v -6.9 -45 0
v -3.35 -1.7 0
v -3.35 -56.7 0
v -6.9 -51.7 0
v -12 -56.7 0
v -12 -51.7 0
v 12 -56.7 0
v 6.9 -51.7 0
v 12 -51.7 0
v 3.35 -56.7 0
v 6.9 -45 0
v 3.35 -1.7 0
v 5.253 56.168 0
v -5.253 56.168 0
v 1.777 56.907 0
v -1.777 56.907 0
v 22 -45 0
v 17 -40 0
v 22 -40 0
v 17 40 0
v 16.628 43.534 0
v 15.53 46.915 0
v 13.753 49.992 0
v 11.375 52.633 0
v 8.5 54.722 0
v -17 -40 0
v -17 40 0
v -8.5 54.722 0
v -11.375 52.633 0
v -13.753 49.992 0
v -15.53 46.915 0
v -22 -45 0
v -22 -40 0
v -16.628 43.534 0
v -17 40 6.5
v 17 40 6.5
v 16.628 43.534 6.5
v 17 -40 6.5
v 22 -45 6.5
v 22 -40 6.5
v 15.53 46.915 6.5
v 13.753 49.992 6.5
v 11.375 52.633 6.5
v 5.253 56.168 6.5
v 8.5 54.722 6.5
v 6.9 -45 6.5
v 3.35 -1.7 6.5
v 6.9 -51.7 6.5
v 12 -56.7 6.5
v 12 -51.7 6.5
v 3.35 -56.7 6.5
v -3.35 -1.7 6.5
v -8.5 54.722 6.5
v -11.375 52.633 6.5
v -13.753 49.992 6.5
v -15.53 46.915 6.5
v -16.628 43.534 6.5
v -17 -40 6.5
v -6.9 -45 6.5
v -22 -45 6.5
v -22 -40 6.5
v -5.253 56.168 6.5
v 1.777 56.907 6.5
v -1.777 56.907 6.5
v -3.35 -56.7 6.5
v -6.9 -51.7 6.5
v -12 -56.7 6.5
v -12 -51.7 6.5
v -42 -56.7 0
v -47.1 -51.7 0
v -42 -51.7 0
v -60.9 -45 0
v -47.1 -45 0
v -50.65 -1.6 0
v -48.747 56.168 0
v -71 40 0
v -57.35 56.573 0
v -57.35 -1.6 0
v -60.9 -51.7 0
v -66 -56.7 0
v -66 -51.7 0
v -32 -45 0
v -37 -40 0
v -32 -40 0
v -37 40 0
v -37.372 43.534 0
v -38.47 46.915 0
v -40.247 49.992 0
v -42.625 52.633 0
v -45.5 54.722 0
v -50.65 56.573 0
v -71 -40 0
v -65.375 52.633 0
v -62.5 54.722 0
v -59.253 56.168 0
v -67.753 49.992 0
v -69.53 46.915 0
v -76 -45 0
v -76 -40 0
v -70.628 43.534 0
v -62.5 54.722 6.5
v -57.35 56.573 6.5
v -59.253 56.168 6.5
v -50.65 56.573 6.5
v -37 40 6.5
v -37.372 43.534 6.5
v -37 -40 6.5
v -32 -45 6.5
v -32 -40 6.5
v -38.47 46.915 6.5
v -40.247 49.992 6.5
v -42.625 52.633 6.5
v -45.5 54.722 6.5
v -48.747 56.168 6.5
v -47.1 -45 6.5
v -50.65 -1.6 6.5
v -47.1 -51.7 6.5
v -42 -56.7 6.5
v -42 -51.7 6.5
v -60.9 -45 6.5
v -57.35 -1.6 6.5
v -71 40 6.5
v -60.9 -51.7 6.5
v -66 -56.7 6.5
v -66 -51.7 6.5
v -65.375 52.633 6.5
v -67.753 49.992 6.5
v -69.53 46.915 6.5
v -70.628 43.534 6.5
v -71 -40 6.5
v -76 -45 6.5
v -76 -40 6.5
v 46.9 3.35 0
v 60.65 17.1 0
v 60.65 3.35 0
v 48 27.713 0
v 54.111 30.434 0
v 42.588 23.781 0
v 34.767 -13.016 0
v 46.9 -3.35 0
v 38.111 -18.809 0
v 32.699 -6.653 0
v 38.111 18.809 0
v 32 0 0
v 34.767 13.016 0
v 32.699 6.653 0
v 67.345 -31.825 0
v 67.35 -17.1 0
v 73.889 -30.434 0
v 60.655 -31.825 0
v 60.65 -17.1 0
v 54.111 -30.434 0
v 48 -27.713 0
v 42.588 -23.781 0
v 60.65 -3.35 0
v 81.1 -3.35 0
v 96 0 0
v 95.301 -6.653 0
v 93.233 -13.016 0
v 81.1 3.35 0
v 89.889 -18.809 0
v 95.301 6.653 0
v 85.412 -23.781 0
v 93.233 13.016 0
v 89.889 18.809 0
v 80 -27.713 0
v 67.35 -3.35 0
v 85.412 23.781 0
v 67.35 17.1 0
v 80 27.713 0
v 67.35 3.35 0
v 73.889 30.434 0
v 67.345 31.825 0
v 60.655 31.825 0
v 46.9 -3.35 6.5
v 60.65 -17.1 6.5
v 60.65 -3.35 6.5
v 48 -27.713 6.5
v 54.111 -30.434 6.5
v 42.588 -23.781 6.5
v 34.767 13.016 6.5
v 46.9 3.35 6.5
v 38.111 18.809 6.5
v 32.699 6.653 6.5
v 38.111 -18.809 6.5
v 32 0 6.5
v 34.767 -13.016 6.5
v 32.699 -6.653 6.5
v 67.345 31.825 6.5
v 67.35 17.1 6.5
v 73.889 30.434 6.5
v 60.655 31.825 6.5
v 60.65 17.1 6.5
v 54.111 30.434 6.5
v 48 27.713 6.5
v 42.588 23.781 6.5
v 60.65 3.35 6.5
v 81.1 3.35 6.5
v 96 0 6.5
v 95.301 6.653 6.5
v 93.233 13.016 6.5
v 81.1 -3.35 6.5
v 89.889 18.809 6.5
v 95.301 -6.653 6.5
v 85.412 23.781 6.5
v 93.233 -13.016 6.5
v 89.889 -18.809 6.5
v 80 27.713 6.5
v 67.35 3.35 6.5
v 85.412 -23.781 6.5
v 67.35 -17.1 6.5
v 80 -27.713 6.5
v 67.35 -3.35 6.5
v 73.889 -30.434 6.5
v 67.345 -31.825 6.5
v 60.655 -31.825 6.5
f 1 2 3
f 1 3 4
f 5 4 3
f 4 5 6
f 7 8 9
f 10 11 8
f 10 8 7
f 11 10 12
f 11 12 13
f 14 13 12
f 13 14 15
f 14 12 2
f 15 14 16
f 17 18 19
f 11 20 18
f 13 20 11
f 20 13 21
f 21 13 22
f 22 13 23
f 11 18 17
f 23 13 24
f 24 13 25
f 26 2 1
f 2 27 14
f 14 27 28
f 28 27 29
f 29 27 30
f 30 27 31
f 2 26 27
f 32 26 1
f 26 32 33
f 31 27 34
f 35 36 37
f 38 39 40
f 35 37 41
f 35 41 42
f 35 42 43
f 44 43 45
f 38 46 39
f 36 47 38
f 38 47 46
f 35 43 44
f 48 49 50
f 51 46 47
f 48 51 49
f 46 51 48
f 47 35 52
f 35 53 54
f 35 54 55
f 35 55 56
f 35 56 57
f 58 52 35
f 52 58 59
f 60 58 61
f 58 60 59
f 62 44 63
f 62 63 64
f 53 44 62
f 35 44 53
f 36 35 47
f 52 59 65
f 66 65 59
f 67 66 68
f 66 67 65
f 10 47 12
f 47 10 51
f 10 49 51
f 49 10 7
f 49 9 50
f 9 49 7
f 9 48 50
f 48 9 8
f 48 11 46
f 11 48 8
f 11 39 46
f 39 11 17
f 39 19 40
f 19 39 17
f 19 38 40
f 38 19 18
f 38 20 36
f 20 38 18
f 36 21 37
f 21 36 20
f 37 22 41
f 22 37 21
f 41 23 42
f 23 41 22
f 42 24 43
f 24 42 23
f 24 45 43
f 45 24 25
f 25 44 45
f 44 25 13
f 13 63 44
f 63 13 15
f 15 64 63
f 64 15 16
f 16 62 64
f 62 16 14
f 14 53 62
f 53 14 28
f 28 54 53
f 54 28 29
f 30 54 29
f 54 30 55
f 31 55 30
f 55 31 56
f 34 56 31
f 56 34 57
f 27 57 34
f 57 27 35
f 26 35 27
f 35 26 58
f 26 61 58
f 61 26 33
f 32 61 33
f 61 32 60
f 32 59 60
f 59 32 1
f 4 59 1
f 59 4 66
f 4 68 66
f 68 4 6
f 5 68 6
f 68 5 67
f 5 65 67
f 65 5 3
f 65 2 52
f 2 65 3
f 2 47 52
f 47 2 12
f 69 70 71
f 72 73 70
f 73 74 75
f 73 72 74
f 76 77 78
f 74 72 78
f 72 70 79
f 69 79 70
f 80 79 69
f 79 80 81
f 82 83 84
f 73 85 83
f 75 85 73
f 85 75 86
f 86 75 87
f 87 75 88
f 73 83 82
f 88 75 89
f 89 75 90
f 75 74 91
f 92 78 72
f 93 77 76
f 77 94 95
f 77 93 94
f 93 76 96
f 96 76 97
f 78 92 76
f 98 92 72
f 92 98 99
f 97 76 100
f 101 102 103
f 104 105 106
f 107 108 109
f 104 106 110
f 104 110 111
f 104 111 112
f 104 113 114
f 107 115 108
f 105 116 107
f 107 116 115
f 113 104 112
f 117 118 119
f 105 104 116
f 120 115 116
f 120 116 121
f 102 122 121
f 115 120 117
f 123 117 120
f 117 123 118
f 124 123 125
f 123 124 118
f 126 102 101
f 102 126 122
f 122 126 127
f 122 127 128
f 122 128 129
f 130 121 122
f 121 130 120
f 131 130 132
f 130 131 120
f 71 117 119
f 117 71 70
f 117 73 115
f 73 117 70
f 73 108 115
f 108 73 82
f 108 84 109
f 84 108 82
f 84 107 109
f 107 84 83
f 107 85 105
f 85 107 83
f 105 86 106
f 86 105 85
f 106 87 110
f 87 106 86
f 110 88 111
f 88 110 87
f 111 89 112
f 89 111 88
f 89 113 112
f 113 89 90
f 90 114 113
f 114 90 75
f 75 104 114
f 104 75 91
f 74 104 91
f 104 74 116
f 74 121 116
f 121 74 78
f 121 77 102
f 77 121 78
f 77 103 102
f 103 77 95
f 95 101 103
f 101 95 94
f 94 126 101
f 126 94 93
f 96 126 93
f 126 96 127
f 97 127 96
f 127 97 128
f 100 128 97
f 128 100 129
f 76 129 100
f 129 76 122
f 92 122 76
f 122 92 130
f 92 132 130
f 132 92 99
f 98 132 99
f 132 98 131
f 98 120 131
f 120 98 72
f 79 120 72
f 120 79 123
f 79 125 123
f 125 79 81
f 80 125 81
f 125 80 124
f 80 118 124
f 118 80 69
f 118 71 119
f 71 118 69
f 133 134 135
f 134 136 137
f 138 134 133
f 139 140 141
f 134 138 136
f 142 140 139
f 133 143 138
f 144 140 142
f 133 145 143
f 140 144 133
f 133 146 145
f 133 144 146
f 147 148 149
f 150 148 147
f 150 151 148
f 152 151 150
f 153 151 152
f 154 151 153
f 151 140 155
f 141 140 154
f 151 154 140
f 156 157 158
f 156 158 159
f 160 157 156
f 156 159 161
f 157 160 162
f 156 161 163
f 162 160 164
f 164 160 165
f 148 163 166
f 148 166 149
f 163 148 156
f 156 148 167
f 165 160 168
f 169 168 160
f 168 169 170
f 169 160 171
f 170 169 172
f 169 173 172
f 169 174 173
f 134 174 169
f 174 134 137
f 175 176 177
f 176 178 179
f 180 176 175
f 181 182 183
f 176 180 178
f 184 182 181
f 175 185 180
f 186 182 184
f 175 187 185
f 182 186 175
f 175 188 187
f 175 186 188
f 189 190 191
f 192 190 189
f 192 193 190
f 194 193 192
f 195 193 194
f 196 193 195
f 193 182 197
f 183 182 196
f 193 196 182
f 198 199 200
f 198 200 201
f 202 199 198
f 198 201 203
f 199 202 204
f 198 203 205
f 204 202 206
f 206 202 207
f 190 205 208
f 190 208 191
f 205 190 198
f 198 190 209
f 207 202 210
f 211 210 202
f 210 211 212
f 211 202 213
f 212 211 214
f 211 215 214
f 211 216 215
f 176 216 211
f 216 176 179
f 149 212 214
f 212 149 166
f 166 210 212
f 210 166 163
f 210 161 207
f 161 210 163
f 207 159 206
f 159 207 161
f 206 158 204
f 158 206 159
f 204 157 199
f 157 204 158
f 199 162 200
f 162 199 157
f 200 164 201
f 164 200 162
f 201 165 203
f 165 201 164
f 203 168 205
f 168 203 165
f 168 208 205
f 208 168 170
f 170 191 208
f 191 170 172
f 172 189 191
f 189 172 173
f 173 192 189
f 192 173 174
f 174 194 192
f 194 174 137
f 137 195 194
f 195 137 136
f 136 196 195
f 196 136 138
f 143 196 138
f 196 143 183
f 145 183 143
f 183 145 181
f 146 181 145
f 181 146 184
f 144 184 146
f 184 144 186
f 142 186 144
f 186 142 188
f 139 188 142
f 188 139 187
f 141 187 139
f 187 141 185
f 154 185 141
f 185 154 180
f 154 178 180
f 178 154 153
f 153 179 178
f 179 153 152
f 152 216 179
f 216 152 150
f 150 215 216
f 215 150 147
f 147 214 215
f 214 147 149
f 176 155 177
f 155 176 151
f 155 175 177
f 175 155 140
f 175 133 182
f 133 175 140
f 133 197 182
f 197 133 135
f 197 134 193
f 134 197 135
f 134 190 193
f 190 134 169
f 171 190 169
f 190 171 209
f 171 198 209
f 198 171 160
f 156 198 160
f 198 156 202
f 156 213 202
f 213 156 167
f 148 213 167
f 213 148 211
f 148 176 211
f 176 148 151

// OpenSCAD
/*
Deltaprintr Spool Holder OpenSCAD Model
Copyright (C) 2015 Marcio Teixeira

This program is free software; you can redistribute it and/or
modify it under the terms of the GNU General Public License
as published by the Free Software Foundation; either version 2
of the License, or (at your option) any later version.

This program is distributed in the hope that it will be useful,
but WITHOUT ANY WARRANTY; without even the implied warranty of
MERCHANTABILITY or FITNESS FOR A PARTICULAR PURPOSE.  See the
GNU General Public License for more details.

You should have received a copy of the GNU General Public License
along with this program; if not, write to the Free Software
Foundation, Inc., 51 Franklin Street, Fifth Floor, Boston, MA  02110-1301, USA.
*/

/* [Global] */

// Select what part to print.
part = "all"; // [part1, part2, part3, all]

/* [Spool size] */
spool_hole_diameter_mm    = 38;
spool_height_mm           = 80;
// Desired gap between spool holder and spool hole
spool_clearance_mm        = 2;

/* [Print Parameters] */
// Gap between tight fitting parts
fit_tolerance_mm          = 0.1;

/* [Deltaprintr Measurments] */
// Inner diameter of plus-shaped cutout
mount_inner_diameter_mm   = 14;
// Outer diameter of plus-shaped cutout
mount_outer_diameter_mm   = 24;
// Thickness of laser-cut wood used in the deltaprintr
wood_thickness_mm         = 6.5;

/* [Cosmetic] */
base_overhang_mm          = 30;
lower_notch_depth_mm      = 55;
lip_mm                    = 5;

/* [hidden] */
part_separation           = 10;

/* You should not need to edit anything past this point */
spindle_width_mm          = spool_hole_diameter_mm - spool_clearance_mm*2;
total_spindle_height      = spindle_width_mm/2 + spool_height_mm + lip_mm + wood_thickness_mm + fit_tolerance_mm + lip_mm;
upper_notch_depth_mm      = total_spindle_height - lower_notch_depth_mm;
base_diameter_mm          = spindle_width_mm + base_overhang_mm;


module spindle() {
	square(size = [spindle_width_mm, spool_height_mm], center = true);
	translate([0, spool_height_mm/2, 0])
		circle(d = spindle_width_mm);
	translate([0, -spool_height_mm/2 - lip_mm/2, 0])
		square(size = [spindle_width_mm + lip_mm*2, lip_mm], center = true);
	translate([0, -spool_height_mm/2 - lip_mm - wood_thickness_mm/2 - fit_tolerance_mm, 0])
		square(size = [mount_inner_diameter_mm - fit_tolerance_mm*2, wood_thickness_mm + fit_tolerance_mm*2], center = true);
	translate([0, -spool_height_mm/2 - lip_mm - wood_thickness_mm - lip_mm/2 - fit_tolerance_mm*2, 0])
		square(size = [mount_outer_diameter_mm, lip_mm], center = true);
}

module part1() {
    linear_extrude(height = wood_thickness_mm)
    difference() {
        spindle();
        translate([0, -spool_height_mm/2 - lip_mm - wood_thickness_mm - lip_mm - fit_tolerance_mm*2 + lower_notch_depth_mm/2, 0])
            square(size = [wood_thickness_mm + fit_tolerance_mm*2, lower_notch_depth_mm], center = true);
    }
}


module part2() {
    linear_extrude(height = wood_thickness_mm)
    difference() {
        spindle();
        translate([0, spool_height_mm/2 + spindle_width_mm/2 - upper_notch_depth_mm/2, 0])
            square(size = [wood_thickness_mm + fit_tolerance_mm*2, upper_notch_depth_mm], center=true);
    }
}

module part3() {
	linear_extrude(height = wood_thickness_mm)
	difference() {
		circle(d = base_diameter_mm);
		square(size = [spindle_width_mm + fit_tolerance_mm*2, wood_thickness_mm + fit_tolerance_mm*2], center=true);
		square(size = [wood_thickness_mm + fit_tolerance_mm*2, spindle_width_mm + fit_tolerance_mm*2], center=true);
	}
}

if( part == "part1" ) {
    part1();
}
else if( part == "part2" ) {
    part2();
}
else if( part == "part3" ) {
    part3();
}
else if( part == "all" ) {
    part1();
    translate( [-spindle_width_mm - lip_mm*2 - part_separation, 0, 0])
        part2();
	translate( [spindle_width_mm/2 + lip_mm + part_separation + base_diameter_mm/2, 0, 0])
        part3();
}
